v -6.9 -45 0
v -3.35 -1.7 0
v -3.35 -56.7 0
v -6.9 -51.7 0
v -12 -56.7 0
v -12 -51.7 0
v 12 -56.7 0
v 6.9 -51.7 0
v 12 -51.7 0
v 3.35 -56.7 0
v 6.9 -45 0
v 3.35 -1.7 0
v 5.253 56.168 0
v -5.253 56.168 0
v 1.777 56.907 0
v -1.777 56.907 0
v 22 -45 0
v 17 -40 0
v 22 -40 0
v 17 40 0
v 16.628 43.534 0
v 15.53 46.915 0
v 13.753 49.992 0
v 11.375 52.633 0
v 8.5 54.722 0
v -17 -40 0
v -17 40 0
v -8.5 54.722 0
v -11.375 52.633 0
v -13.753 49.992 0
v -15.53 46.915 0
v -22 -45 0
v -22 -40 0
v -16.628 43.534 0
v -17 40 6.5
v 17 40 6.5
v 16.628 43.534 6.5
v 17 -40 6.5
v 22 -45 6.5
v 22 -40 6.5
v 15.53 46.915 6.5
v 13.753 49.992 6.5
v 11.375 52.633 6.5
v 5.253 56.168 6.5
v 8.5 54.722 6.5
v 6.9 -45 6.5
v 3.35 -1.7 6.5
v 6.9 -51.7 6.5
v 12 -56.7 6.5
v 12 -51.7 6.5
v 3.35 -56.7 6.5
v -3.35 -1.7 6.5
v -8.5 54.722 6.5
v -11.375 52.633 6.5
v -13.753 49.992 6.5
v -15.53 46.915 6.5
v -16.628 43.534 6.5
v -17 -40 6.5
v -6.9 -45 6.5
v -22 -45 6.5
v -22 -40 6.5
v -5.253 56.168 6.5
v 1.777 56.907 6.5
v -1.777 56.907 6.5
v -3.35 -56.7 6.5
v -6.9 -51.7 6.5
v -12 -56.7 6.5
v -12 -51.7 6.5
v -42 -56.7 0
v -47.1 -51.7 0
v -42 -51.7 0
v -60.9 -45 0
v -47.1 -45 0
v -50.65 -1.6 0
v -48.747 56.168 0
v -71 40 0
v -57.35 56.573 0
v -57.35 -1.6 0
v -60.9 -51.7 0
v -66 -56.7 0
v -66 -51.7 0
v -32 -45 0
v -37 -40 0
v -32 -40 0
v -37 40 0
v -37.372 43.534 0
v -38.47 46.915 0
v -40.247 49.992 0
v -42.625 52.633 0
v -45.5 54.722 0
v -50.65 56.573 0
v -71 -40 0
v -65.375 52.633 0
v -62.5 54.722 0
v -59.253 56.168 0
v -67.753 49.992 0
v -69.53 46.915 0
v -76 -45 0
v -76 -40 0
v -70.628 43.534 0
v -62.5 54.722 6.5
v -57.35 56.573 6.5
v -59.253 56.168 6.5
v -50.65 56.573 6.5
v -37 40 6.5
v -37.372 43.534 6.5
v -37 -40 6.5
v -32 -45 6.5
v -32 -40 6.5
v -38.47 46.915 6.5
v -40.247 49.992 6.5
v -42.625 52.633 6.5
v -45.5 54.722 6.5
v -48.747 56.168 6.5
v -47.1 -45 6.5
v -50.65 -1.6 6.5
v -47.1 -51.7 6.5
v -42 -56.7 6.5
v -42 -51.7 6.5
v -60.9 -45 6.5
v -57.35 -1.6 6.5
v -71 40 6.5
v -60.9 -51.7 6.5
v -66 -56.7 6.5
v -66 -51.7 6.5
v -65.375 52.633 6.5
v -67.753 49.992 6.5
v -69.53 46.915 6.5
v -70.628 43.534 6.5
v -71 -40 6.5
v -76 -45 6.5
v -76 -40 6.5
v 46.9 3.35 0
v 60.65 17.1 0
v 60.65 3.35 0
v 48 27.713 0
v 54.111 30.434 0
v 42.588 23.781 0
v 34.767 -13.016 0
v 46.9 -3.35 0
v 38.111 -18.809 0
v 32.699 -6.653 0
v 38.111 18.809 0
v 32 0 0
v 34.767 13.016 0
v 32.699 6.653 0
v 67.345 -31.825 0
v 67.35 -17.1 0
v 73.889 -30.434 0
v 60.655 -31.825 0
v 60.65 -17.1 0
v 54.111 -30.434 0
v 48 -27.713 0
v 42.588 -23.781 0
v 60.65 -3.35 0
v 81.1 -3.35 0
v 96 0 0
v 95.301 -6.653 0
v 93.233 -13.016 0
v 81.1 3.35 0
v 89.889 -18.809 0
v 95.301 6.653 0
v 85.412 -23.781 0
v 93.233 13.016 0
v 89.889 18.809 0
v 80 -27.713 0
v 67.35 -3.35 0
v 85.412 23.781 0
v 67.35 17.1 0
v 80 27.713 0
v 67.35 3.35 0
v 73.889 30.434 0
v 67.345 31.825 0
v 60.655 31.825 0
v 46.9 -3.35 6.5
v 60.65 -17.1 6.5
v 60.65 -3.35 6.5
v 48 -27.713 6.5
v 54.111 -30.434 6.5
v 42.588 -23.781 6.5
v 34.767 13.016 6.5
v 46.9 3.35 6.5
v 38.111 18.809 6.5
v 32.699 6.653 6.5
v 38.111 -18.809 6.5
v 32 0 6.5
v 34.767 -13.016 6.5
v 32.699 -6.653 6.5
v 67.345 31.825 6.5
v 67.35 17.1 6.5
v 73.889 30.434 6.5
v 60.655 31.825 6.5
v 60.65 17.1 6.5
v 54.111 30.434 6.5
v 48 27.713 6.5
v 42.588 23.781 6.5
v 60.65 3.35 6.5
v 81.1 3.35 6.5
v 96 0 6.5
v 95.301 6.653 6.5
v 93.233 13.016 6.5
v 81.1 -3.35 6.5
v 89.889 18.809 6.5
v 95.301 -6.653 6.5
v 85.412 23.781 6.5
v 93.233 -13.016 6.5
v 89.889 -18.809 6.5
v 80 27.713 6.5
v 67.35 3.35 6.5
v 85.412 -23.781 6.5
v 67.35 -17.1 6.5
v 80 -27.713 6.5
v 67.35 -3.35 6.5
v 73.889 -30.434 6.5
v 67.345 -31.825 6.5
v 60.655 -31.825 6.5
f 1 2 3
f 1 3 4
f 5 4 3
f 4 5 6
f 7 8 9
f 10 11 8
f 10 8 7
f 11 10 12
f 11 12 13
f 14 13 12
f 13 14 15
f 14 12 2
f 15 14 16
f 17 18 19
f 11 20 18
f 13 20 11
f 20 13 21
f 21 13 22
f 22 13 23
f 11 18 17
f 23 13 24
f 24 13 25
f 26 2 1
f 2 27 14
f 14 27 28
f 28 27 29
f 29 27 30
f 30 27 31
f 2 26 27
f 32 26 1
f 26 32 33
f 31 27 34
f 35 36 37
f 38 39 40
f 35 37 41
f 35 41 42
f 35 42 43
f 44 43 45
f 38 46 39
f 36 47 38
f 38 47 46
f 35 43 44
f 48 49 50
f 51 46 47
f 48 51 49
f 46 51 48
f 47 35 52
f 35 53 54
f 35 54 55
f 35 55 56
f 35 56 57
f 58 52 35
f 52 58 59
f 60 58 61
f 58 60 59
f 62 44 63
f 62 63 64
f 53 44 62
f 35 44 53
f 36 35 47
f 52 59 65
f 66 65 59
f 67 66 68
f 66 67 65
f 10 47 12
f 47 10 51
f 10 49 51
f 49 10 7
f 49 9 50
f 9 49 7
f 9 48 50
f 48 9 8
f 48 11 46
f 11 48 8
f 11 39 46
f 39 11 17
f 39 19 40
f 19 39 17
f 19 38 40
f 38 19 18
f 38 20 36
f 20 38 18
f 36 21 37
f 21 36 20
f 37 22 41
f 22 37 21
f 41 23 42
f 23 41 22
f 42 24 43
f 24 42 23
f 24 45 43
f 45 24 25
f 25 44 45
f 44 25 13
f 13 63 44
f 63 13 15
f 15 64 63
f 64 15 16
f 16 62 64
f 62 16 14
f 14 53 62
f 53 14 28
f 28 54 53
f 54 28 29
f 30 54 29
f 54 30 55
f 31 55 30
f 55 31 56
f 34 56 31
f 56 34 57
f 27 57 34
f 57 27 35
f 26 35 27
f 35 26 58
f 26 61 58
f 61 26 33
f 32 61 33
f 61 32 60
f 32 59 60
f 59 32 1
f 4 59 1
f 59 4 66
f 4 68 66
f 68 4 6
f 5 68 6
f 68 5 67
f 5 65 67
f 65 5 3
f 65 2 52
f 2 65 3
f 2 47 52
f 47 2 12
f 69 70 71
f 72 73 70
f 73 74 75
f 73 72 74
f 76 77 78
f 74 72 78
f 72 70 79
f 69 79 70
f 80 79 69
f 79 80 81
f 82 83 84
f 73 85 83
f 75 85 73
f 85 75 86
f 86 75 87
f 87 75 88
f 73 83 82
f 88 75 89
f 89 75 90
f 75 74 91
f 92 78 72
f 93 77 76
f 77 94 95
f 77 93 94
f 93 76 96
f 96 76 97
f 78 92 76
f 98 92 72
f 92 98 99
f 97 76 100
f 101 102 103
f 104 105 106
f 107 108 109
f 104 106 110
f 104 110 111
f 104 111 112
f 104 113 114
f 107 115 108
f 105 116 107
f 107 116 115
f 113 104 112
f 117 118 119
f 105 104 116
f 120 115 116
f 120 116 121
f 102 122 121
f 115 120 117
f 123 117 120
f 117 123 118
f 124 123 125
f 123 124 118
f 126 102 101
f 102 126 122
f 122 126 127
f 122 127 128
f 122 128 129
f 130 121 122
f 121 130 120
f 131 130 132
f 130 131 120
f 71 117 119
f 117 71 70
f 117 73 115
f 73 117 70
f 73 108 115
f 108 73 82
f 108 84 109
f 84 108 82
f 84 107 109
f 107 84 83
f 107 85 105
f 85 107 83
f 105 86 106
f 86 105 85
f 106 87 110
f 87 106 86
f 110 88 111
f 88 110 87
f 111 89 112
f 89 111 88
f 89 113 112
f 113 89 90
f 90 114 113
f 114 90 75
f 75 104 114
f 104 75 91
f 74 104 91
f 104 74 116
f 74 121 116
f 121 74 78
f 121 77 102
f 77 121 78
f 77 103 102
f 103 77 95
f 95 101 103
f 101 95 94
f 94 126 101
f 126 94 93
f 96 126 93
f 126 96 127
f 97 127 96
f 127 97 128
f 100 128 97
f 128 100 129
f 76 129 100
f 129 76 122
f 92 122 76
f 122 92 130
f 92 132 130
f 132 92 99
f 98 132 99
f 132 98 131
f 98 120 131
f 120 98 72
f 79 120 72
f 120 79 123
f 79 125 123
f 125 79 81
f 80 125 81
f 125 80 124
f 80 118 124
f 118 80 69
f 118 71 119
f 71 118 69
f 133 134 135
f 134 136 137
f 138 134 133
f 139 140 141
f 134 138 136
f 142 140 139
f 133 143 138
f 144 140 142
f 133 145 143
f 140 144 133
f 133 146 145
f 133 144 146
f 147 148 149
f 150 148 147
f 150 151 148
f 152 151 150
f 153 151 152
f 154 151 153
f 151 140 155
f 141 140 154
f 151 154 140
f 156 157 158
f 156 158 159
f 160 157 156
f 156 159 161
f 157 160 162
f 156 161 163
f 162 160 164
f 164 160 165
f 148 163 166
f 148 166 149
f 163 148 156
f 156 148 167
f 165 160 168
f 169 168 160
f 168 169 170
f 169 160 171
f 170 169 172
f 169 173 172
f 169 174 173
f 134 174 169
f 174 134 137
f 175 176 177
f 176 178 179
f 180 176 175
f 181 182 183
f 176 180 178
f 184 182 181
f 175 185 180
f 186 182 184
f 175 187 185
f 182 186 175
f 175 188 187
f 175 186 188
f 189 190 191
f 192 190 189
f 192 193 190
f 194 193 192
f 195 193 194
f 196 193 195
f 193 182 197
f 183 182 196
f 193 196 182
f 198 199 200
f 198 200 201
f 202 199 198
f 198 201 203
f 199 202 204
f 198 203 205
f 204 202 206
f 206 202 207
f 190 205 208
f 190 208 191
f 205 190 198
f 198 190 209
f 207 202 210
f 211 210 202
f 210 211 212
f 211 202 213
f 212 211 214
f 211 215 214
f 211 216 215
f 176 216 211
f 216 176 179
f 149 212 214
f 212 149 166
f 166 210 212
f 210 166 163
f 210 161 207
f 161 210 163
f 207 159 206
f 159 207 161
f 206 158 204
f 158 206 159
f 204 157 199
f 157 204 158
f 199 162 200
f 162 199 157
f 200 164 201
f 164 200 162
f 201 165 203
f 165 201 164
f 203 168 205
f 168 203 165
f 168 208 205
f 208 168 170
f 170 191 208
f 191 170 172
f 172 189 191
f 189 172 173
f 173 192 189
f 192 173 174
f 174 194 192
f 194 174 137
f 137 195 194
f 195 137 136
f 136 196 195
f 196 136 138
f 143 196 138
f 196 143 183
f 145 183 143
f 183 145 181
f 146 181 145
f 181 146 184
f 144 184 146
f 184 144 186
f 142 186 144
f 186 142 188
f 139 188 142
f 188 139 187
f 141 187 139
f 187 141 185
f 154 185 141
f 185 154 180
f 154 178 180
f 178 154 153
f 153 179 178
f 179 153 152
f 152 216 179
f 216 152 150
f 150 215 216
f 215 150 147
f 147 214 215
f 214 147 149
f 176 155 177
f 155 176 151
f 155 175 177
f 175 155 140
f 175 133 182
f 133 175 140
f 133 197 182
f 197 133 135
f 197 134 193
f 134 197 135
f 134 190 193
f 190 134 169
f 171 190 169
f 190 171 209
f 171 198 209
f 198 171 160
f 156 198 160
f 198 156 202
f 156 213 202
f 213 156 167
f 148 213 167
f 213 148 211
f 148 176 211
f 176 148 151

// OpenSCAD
/*
Deltaprintr Spool Holder OpenSCAD Model
Copyright (C) 2015 Marcio Teixeira

This program is free software; you can redistribute it and/or
modify it under the terms of the GNU General Public License
as published by the Free Software Foundation; either version 2
of the License, or (at your option) any later version.

This program is distributed in the hope that it will be useful,
but WITHOUT ANY WARRANTY; without even the implied warranty of
MERCHANTABILITY or FITNESS FOR A PARTICULAR PURPOSE.  See the
GNU General Public License for more details.

You should have received a copy of the GNU General Public License
along with this program; if not, write to the Free Software
Foundation, Inc., 51 Franklin Street, Fifth Floor, Boston, MA  02110-1301, USA.
*/

/* [Global] */

// Select what part to print.
part = "all"; // [part1, part2, part3, all]

/* [Spool size] */
spool_hole_diameter_mm    = 38;
spool_height_mm           = 80;
// Desired gap between spool holder and spool hole
spool_clearance_mm        = 2;

/* [Print Parameters] */
// Gap between tight fitting parts
fit_tolerance_mm          = 0.1;

/* [Deltaprintr Measurments] */
// Inner diameter of plus-shaped cutout
mount_inner_diameter_mm   = 14;
// Outer diameter of plus-shaped cutout
mount_outer_diameter_mm   = 24;
// Thickness of laser-cut wood used in the deltaprintr
wood_thickness_mm         = 6.5;

/* [Cosmetic] */
base_overhang_mm          = 30;
lower_notch_depth_mm      = 55;
lip_mm                    = 5;

/* [hidden] */
part_separation           = 10;

/* You should not need to edit anything past this point */
spindle_width_mm          = spool_hole_diameter_mm - spool_clearance_mm*2;
total_spindle_height      = spindle_width_mm/2 + spool_height_mm + lip_mm + wood_thickness_mm + fit_tolerance_mm + lip_mm;
upper_notch_depth_mm      = total_spindle_height - lower_notch_depth_mm;
base_diameter_mm          = spindle_width_mm + base_overhang_mm;


module spindle() {
	square(size = [spindle_width_mm, spool_height_mm], center = true);
	translate([0, spool_height_mm/2, 0])
		circle(d = spindle_width_mm);
	translate([0, -spool_height_mm/2 - lip_mm/2, 0])
		square(size = [spindle_width_mm + lip_mm*2, lip_mm], center = true);
	translate([0, -spool_height_mm/2 - lip_mm - wood_thickness_mm/2 - fit_tolerance_mm, 0])
		square(size = [mount_inner_diameter_mm - fit_tolerance_mm*2, wood_thickness_mm + fit_tolerance_mm*2], center = true);
	translate([0, -spool_height_mm/2 - lip_mm - wood_thickness_mm - lip_mm/2 - fit_tolerance_mm*2, 0])
		square(size = [mount_outer_diameter_mm, lip_mm], center = true);
}

module part1() {
    linear_extrude(height = wood_thickness_mm)
    difference() {
        spindle();
        translate([0, -spool_height_mm/2 - lip_mm - wood_thickness_mm - lip_mm - fit_tolerance_mm*2 + lower_notch_depth_mm/2, 0])
            square(size = [wood_thickness_mm + fit_tolerance_mm*2, lower_notch_depth_mm], center = true);
    }
}


module part2() {
    linear_extrude(height = wood_thickness_mm)
    difference() {
        spindle();
        translate([0, spool_height_mm/2 + spindle_width_mm/2 - upper_notch_depth_mm/2, 0])
            square(size = [wood_thickness_mm + fit_tolerance_mm*2, upper_notch_depth_mm], center=true);
    }
}

module part3() {
	linear_extrude(height = wood_thickness_mm)
	difference() {
		circle(d = base_diameter_mm);
		square(size = [spindle_width_mm + fit_tolerance_mm*2, wood_thickness_mm + fit_tolerance_mm*2], center=true);
		square(size = [wood_thickness_mm + fit_tolerance_mm*2, spindle_width_mm + fit_tolerance_mm*2], center=true);
	}
}

if( part == "part1" ) {
    part1();
}
else if( part == "part2" ) {
    part2();
}
else if( part == "part3" ) {
    part3();
}
else if( part == "all" ) {
    part1();
    translate( [-spindle_width_mm - lip_mm*2 - part_separation, 0, 0])
        part2();
	translate( [spindle_width_mm/2 + lip_mm + part_separation + base_diameter_mm/2, 0, 0])
        part3();
}
